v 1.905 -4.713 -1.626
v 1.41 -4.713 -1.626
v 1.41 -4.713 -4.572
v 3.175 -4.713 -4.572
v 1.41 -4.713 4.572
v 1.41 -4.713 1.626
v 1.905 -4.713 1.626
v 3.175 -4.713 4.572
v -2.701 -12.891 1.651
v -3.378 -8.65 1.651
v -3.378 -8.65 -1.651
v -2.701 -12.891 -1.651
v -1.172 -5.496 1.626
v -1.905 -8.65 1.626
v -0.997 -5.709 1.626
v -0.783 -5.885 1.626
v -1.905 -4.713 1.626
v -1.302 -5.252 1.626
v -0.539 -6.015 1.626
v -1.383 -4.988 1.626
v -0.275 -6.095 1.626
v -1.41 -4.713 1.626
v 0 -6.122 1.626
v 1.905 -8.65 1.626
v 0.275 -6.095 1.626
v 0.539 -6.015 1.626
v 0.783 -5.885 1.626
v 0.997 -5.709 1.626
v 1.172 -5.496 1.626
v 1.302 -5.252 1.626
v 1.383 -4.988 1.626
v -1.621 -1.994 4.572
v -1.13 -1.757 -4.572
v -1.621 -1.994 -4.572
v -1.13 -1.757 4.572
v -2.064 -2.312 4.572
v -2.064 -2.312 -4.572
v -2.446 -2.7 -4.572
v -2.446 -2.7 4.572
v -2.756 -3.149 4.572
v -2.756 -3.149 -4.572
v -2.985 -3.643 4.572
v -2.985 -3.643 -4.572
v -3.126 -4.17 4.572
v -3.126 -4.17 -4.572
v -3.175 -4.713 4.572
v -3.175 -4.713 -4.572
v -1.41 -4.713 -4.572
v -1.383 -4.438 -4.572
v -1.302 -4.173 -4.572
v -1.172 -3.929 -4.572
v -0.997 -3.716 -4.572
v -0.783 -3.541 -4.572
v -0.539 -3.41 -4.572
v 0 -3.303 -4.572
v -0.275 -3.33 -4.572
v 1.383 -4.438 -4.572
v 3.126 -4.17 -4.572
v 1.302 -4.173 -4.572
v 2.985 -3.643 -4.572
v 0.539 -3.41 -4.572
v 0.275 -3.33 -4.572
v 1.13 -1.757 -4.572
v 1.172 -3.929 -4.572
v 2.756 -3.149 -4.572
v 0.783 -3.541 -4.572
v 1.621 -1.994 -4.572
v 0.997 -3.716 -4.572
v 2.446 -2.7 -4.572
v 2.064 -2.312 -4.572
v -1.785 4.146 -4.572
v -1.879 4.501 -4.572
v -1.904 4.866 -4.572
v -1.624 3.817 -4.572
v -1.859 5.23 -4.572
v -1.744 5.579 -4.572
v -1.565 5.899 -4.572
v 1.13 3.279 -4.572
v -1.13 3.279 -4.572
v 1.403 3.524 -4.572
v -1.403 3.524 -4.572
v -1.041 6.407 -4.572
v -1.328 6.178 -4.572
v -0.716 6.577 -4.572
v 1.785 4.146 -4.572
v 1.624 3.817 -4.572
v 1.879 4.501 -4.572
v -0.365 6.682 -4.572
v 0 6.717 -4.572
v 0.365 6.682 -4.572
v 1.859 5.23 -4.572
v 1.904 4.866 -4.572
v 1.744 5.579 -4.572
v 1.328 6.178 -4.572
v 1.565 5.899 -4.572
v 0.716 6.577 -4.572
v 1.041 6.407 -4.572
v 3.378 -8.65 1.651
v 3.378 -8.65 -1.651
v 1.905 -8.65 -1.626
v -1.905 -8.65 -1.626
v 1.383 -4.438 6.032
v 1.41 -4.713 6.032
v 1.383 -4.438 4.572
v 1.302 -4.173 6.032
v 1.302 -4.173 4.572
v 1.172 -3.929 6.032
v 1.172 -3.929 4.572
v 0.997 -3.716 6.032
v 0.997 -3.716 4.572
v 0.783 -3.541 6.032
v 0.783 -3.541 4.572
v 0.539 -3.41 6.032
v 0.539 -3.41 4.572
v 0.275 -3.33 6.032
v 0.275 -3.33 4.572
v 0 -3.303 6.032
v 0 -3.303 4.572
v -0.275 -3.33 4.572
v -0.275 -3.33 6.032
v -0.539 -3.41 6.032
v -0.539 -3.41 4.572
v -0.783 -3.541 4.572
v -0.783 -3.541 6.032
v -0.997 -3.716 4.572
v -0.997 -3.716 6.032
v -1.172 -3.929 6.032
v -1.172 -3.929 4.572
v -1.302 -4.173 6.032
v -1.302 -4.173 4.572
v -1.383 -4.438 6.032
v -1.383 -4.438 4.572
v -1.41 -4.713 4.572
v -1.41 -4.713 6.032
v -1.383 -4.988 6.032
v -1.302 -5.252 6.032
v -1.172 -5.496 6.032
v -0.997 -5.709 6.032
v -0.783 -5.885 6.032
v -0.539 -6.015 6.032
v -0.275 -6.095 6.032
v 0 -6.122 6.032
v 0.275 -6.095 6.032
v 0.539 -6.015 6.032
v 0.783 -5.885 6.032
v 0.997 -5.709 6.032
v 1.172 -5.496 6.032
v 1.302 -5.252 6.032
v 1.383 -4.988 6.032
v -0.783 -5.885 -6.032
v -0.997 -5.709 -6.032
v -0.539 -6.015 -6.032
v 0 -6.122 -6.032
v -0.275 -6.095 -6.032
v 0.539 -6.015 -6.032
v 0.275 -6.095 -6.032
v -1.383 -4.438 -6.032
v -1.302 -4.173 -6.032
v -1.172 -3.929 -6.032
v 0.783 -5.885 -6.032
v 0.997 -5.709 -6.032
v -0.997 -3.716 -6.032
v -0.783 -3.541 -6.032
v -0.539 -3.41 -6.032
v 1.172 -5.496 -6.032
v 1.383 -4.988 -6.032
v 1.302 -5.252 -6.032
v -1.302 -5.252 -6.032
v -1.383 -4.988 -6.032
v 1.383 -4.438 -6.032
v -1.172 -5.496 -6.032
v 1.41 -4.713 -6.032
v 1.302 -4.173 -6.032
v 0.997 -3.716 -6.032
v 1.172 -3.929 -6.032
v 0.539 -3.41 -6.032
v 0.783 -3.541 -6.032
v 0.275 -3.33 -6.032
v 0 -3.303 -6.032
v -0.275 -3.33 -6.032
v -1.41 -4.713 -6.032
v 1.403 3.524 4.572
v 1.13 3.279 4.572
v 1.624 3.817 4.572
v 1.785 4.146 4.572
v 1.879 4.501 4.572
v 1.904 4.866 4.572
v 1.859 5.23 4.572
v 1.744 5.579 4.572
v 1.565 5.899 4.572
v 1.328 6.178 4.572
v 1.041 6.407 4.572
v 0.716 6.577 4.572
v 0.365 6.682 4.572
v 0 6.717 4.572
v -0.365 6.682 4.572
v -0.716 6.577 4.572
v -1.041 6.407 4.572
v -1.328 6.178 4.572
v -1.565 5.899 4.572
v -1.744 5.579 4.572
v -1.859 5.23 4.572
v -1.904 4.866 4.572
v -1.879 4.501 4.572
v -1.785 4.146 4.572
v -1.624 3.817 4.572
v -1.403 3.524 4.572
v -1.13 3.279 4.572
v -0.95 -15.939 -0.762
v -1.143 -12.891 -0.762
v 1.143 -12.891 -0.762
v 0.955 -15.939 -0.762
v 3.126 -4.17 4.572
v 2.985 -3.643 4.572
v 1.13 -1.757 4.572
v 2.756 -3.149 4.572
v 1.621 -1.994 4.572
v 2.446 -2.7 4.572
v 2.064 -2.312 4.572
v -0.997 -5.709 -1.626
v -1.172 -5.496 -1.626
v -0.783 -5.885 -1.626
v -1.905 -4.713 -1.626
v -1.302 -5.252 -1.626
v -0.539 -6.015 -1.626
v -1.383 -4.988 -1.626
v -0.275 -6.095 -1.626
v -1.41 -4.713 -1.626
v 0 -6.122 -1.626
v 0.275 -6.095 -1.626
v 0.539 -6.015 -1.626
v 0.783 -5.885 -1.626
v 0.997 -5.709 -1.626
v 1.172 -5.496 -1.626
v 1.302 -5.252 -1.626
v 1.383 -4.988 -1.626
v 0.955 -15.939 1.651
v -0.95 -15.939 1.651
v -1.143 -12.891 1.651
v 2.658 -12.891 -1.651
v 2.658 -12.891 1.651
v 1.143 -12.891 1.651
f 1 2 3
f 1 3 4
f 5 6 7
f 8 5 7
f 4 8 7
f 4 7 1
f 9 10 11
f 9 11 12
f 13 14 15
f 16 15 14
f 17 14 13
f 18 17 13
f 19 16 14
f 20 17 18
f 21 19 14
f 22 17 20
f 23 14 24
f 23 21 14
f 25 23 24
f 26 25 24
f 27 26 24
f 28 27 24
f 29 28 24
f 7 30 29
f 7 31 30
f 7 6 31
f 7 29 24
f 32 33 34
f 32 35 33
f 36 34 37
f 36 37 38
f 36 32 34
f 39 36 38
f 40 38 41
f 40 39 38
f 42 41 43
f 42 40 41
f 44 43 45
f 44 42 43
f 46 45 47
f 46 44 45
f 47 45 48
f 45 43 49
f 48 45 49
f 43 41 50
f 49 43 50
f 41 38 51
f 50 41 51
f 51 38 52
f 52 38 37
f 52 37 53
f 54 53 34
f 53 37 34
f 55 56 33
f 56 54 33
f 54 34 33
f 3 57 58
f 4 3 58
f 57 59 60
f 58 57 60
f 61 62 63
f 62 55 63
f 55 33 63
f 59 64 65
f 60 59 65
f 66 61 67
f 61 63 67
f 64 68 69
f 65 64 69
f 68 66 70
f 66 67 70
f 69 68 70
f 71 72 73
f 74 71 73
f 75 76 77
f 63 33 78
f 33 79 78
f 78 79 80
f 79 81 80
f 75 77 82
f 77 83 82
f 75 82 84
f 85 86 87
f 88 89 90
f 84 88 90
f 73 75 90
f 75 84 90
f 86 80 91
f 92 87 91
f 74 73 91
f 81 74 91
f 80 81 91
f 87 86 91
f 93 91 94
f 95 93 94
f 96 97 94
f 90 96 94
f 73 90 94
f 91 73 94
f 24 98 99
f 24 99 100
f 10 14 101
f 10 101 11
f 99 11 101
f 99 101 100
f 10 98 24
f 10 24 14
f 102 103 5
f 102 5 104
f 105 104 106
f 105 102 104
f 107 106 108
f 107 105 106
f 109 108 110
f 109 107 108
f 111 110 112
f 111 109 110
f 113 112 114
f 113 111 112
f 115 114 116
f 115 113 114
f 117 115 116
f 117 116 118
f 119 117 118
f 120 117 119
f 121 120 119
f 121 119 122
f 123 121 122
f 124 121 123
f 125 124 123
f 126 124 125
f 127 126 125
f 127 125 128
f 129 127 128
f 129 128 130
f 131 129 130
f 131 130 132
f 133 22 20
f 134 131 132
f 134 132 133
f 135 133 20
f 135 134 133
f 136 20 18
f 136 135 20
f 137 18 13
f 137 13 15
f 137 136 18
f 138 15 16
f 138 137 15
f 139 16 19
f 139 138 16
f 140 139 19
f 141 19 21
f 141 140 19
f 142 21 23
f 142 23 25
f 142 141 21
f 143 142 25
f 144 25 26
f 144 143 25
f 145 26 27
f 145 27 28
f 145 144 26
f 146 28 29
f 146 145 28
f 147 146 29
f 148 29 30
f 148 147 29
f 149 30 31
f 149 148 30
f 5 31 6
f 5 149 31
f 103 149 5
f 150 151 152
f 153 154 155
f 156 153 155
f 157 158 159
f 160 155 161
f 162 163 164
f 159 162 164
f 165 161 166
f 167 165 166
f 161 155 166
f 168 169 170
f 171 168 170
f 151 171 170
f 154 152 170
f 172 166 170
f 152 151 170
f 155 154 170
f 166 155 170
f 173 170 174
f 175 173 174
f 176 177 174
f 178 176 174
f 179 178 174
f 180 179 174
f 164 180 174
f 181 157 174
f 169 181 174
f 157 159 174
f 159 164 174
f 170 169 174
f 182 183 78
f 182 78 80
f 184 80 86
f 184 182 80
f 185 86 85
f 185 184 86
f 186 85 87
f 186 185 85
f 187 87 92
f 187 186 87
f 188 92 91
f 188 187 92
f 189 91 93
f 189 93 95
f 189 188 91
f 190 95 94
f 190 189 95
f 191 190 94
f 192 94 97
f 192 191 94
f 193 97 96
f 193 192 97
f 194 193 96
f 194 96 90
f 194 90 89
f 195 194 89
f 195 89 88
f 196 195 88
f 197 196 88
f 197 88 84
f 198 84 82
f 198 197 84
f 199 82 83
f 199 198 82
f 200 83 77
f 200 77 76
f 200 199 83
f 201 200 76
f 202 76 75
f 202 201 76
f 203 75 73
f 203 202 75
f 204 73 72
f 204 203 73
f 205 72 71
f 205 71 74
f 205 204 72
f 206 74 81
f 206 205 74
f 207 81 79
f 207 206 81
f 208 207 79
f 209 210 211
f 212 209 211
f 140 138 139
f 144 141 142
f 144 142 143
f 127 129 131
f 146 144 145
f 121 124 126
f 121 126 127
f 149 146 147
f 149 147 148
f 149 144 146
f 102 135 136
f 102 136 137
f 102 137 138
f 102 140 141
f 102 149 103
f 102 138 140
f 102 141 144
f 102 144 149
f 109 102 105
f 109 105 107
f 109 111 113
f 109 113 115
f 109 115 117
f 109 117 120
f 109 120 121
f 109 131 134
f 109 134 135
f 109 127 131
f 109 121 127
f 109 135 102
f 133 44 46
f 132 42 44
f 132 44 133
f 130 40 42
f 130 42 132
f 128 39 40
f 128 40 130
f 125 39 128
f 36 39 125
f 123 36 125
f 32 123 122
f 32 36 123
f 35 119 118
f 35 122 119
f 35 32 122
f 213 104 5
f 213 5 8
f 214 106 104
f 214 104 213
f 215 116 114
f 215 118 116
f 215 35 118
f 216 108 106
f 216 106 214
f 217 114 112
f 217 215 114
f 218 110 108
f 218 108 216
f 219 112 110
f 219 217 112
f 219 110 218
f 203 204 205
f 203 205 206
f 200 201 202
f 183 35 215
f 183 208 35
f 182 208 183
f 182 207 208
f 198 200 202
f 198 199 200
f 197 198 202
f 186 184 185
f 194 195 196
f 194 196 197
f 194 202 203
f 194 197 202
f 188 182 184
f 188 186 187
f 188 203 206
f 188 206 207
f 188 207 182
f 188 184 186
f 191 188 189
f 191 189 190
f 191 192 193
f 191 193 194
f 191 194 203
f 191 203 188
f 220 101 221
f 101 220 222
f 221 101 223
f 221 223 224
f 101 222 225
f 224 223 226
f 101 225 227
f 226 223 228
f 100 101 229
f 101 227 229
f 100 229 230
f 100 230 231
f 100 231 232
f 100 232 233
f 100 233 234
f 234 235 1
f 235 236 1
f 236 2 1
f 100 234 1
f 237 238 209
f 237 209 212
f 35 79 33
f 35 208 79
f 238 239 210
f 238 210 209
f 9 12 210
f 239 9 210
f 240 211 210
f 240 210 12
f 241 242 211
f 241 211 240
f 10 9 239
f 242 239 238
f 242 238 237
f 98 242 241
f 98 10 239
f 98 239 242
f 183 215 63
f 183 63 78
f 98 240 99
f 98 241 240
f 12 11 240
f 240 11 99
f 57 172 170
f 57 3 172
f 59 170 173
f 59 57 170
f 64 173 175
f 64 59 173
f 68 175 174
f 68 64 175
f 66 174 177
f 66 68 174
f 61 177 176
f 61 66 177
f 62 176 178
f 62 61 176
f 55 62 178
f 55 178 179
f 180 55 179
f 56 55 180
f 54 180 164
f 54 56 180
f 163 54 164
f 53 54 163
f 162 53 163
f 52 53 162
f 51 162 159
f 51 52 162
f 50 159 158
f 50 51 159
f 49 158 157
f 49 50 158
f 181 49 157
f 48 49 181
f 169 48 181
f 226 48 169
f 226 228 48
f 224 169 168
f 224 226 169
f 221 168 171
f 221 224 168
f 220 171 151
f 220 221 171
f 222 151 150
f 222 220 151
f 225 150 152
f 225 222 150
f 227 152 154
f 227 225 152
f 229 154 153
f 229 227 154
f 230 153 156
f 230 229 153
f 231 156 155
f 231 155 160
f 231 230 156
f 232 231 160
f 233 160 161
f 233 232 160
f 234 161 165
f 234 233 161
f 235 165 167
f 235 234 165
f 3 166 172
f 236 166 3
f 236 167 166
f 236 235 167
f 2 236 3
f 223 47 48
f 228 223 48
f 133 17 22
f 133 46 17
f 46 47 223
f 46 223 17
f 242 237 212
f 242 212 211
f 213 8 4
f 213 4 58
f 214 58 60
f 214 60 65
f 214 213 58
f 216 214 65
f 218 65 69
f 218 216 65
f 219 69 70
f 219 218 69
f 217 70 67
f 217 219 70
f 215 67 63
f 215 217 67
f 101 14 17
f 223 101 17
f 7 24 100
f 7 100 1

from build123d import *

# Parameters (mm, degrees)
F1_DEPTH = 4.572
F2_R     = 1.4097
F3_DEPTH = 6.0325
F4_W     = 3.81
F4_H     = 3.937
F5_DEPTH = 1.6256
F7_DEPTH = 1.651
F9_DEPTH = 2.413


with BuildPart() as f1:
    # F0 (on Top) → F1 (new body, symmetric)
    with BuildSketch(Plane.XY):
        with BuildLine():
            Line((-3.174979, -4.71263), (-1.1303, -4.71263))
            Line((-1.1303, -4.71263), (1.1303, -4.71263))
            Line((1.1303, -4.71263), (3.174979, -4.71263))
            ThreePointArc((3.174979, -4.71263), (2.611007, -2.917836), (1.1303, -1.757295))
            Line((1.1303, -1.757295), (1.1303, 3.278927))
            ThreePointArc((1.1303, 3.278927), (0, 6.71737), (-1.1303, 3.278927))
            Line((-1.1303, 3.278927), (-1.1303, -1.757295))
            ThreePointArc((-1.1303, -1.757295), (-2.611007, -2.917836), (-3.174979, -4.71263))
        make_face()
    extrude(amount=F1_DEPTH, both=True)

    # F2 (on Top) → F3 (join, symmetric)
    with BuildSketch(Plane.XY):
        with Locations((0, -4.71263)):
            Circle(F2_R)
    extrude(amount=F3_DEPTH, both=True)

    # F4 (on Top) → F5 (join, symmetric)
    with BuildSketch(Plane.XY):
        with Locations((0, -6.68113)):
            Rectangle(F4_W, F4_H)
    extrude(amount=F5_DEPTH, both=True)

    # F6 (on Top) → F7 (join, symmetric)
    with BuildSketch(Plane.XY):
        Polygon((3.3782, -8.64963), (-3.3782, -8.64963), (-2.701088, -12.89143), (2.658312, -12.89143), align=None)
    extrude(amount=F7_DEPTH, both=True)

    # F8 (on face) → F9 (join)
    with BuildSketch(Plane.XY.offset(1.651)):
        Polygon((1.143, -12.89143), (-1.143, -12.89143), (-0.950346, -15.93943), (0.954654, -15.93943), align=None)
    extrude(amount=-F9_DEPTH)


solid = f1.part
